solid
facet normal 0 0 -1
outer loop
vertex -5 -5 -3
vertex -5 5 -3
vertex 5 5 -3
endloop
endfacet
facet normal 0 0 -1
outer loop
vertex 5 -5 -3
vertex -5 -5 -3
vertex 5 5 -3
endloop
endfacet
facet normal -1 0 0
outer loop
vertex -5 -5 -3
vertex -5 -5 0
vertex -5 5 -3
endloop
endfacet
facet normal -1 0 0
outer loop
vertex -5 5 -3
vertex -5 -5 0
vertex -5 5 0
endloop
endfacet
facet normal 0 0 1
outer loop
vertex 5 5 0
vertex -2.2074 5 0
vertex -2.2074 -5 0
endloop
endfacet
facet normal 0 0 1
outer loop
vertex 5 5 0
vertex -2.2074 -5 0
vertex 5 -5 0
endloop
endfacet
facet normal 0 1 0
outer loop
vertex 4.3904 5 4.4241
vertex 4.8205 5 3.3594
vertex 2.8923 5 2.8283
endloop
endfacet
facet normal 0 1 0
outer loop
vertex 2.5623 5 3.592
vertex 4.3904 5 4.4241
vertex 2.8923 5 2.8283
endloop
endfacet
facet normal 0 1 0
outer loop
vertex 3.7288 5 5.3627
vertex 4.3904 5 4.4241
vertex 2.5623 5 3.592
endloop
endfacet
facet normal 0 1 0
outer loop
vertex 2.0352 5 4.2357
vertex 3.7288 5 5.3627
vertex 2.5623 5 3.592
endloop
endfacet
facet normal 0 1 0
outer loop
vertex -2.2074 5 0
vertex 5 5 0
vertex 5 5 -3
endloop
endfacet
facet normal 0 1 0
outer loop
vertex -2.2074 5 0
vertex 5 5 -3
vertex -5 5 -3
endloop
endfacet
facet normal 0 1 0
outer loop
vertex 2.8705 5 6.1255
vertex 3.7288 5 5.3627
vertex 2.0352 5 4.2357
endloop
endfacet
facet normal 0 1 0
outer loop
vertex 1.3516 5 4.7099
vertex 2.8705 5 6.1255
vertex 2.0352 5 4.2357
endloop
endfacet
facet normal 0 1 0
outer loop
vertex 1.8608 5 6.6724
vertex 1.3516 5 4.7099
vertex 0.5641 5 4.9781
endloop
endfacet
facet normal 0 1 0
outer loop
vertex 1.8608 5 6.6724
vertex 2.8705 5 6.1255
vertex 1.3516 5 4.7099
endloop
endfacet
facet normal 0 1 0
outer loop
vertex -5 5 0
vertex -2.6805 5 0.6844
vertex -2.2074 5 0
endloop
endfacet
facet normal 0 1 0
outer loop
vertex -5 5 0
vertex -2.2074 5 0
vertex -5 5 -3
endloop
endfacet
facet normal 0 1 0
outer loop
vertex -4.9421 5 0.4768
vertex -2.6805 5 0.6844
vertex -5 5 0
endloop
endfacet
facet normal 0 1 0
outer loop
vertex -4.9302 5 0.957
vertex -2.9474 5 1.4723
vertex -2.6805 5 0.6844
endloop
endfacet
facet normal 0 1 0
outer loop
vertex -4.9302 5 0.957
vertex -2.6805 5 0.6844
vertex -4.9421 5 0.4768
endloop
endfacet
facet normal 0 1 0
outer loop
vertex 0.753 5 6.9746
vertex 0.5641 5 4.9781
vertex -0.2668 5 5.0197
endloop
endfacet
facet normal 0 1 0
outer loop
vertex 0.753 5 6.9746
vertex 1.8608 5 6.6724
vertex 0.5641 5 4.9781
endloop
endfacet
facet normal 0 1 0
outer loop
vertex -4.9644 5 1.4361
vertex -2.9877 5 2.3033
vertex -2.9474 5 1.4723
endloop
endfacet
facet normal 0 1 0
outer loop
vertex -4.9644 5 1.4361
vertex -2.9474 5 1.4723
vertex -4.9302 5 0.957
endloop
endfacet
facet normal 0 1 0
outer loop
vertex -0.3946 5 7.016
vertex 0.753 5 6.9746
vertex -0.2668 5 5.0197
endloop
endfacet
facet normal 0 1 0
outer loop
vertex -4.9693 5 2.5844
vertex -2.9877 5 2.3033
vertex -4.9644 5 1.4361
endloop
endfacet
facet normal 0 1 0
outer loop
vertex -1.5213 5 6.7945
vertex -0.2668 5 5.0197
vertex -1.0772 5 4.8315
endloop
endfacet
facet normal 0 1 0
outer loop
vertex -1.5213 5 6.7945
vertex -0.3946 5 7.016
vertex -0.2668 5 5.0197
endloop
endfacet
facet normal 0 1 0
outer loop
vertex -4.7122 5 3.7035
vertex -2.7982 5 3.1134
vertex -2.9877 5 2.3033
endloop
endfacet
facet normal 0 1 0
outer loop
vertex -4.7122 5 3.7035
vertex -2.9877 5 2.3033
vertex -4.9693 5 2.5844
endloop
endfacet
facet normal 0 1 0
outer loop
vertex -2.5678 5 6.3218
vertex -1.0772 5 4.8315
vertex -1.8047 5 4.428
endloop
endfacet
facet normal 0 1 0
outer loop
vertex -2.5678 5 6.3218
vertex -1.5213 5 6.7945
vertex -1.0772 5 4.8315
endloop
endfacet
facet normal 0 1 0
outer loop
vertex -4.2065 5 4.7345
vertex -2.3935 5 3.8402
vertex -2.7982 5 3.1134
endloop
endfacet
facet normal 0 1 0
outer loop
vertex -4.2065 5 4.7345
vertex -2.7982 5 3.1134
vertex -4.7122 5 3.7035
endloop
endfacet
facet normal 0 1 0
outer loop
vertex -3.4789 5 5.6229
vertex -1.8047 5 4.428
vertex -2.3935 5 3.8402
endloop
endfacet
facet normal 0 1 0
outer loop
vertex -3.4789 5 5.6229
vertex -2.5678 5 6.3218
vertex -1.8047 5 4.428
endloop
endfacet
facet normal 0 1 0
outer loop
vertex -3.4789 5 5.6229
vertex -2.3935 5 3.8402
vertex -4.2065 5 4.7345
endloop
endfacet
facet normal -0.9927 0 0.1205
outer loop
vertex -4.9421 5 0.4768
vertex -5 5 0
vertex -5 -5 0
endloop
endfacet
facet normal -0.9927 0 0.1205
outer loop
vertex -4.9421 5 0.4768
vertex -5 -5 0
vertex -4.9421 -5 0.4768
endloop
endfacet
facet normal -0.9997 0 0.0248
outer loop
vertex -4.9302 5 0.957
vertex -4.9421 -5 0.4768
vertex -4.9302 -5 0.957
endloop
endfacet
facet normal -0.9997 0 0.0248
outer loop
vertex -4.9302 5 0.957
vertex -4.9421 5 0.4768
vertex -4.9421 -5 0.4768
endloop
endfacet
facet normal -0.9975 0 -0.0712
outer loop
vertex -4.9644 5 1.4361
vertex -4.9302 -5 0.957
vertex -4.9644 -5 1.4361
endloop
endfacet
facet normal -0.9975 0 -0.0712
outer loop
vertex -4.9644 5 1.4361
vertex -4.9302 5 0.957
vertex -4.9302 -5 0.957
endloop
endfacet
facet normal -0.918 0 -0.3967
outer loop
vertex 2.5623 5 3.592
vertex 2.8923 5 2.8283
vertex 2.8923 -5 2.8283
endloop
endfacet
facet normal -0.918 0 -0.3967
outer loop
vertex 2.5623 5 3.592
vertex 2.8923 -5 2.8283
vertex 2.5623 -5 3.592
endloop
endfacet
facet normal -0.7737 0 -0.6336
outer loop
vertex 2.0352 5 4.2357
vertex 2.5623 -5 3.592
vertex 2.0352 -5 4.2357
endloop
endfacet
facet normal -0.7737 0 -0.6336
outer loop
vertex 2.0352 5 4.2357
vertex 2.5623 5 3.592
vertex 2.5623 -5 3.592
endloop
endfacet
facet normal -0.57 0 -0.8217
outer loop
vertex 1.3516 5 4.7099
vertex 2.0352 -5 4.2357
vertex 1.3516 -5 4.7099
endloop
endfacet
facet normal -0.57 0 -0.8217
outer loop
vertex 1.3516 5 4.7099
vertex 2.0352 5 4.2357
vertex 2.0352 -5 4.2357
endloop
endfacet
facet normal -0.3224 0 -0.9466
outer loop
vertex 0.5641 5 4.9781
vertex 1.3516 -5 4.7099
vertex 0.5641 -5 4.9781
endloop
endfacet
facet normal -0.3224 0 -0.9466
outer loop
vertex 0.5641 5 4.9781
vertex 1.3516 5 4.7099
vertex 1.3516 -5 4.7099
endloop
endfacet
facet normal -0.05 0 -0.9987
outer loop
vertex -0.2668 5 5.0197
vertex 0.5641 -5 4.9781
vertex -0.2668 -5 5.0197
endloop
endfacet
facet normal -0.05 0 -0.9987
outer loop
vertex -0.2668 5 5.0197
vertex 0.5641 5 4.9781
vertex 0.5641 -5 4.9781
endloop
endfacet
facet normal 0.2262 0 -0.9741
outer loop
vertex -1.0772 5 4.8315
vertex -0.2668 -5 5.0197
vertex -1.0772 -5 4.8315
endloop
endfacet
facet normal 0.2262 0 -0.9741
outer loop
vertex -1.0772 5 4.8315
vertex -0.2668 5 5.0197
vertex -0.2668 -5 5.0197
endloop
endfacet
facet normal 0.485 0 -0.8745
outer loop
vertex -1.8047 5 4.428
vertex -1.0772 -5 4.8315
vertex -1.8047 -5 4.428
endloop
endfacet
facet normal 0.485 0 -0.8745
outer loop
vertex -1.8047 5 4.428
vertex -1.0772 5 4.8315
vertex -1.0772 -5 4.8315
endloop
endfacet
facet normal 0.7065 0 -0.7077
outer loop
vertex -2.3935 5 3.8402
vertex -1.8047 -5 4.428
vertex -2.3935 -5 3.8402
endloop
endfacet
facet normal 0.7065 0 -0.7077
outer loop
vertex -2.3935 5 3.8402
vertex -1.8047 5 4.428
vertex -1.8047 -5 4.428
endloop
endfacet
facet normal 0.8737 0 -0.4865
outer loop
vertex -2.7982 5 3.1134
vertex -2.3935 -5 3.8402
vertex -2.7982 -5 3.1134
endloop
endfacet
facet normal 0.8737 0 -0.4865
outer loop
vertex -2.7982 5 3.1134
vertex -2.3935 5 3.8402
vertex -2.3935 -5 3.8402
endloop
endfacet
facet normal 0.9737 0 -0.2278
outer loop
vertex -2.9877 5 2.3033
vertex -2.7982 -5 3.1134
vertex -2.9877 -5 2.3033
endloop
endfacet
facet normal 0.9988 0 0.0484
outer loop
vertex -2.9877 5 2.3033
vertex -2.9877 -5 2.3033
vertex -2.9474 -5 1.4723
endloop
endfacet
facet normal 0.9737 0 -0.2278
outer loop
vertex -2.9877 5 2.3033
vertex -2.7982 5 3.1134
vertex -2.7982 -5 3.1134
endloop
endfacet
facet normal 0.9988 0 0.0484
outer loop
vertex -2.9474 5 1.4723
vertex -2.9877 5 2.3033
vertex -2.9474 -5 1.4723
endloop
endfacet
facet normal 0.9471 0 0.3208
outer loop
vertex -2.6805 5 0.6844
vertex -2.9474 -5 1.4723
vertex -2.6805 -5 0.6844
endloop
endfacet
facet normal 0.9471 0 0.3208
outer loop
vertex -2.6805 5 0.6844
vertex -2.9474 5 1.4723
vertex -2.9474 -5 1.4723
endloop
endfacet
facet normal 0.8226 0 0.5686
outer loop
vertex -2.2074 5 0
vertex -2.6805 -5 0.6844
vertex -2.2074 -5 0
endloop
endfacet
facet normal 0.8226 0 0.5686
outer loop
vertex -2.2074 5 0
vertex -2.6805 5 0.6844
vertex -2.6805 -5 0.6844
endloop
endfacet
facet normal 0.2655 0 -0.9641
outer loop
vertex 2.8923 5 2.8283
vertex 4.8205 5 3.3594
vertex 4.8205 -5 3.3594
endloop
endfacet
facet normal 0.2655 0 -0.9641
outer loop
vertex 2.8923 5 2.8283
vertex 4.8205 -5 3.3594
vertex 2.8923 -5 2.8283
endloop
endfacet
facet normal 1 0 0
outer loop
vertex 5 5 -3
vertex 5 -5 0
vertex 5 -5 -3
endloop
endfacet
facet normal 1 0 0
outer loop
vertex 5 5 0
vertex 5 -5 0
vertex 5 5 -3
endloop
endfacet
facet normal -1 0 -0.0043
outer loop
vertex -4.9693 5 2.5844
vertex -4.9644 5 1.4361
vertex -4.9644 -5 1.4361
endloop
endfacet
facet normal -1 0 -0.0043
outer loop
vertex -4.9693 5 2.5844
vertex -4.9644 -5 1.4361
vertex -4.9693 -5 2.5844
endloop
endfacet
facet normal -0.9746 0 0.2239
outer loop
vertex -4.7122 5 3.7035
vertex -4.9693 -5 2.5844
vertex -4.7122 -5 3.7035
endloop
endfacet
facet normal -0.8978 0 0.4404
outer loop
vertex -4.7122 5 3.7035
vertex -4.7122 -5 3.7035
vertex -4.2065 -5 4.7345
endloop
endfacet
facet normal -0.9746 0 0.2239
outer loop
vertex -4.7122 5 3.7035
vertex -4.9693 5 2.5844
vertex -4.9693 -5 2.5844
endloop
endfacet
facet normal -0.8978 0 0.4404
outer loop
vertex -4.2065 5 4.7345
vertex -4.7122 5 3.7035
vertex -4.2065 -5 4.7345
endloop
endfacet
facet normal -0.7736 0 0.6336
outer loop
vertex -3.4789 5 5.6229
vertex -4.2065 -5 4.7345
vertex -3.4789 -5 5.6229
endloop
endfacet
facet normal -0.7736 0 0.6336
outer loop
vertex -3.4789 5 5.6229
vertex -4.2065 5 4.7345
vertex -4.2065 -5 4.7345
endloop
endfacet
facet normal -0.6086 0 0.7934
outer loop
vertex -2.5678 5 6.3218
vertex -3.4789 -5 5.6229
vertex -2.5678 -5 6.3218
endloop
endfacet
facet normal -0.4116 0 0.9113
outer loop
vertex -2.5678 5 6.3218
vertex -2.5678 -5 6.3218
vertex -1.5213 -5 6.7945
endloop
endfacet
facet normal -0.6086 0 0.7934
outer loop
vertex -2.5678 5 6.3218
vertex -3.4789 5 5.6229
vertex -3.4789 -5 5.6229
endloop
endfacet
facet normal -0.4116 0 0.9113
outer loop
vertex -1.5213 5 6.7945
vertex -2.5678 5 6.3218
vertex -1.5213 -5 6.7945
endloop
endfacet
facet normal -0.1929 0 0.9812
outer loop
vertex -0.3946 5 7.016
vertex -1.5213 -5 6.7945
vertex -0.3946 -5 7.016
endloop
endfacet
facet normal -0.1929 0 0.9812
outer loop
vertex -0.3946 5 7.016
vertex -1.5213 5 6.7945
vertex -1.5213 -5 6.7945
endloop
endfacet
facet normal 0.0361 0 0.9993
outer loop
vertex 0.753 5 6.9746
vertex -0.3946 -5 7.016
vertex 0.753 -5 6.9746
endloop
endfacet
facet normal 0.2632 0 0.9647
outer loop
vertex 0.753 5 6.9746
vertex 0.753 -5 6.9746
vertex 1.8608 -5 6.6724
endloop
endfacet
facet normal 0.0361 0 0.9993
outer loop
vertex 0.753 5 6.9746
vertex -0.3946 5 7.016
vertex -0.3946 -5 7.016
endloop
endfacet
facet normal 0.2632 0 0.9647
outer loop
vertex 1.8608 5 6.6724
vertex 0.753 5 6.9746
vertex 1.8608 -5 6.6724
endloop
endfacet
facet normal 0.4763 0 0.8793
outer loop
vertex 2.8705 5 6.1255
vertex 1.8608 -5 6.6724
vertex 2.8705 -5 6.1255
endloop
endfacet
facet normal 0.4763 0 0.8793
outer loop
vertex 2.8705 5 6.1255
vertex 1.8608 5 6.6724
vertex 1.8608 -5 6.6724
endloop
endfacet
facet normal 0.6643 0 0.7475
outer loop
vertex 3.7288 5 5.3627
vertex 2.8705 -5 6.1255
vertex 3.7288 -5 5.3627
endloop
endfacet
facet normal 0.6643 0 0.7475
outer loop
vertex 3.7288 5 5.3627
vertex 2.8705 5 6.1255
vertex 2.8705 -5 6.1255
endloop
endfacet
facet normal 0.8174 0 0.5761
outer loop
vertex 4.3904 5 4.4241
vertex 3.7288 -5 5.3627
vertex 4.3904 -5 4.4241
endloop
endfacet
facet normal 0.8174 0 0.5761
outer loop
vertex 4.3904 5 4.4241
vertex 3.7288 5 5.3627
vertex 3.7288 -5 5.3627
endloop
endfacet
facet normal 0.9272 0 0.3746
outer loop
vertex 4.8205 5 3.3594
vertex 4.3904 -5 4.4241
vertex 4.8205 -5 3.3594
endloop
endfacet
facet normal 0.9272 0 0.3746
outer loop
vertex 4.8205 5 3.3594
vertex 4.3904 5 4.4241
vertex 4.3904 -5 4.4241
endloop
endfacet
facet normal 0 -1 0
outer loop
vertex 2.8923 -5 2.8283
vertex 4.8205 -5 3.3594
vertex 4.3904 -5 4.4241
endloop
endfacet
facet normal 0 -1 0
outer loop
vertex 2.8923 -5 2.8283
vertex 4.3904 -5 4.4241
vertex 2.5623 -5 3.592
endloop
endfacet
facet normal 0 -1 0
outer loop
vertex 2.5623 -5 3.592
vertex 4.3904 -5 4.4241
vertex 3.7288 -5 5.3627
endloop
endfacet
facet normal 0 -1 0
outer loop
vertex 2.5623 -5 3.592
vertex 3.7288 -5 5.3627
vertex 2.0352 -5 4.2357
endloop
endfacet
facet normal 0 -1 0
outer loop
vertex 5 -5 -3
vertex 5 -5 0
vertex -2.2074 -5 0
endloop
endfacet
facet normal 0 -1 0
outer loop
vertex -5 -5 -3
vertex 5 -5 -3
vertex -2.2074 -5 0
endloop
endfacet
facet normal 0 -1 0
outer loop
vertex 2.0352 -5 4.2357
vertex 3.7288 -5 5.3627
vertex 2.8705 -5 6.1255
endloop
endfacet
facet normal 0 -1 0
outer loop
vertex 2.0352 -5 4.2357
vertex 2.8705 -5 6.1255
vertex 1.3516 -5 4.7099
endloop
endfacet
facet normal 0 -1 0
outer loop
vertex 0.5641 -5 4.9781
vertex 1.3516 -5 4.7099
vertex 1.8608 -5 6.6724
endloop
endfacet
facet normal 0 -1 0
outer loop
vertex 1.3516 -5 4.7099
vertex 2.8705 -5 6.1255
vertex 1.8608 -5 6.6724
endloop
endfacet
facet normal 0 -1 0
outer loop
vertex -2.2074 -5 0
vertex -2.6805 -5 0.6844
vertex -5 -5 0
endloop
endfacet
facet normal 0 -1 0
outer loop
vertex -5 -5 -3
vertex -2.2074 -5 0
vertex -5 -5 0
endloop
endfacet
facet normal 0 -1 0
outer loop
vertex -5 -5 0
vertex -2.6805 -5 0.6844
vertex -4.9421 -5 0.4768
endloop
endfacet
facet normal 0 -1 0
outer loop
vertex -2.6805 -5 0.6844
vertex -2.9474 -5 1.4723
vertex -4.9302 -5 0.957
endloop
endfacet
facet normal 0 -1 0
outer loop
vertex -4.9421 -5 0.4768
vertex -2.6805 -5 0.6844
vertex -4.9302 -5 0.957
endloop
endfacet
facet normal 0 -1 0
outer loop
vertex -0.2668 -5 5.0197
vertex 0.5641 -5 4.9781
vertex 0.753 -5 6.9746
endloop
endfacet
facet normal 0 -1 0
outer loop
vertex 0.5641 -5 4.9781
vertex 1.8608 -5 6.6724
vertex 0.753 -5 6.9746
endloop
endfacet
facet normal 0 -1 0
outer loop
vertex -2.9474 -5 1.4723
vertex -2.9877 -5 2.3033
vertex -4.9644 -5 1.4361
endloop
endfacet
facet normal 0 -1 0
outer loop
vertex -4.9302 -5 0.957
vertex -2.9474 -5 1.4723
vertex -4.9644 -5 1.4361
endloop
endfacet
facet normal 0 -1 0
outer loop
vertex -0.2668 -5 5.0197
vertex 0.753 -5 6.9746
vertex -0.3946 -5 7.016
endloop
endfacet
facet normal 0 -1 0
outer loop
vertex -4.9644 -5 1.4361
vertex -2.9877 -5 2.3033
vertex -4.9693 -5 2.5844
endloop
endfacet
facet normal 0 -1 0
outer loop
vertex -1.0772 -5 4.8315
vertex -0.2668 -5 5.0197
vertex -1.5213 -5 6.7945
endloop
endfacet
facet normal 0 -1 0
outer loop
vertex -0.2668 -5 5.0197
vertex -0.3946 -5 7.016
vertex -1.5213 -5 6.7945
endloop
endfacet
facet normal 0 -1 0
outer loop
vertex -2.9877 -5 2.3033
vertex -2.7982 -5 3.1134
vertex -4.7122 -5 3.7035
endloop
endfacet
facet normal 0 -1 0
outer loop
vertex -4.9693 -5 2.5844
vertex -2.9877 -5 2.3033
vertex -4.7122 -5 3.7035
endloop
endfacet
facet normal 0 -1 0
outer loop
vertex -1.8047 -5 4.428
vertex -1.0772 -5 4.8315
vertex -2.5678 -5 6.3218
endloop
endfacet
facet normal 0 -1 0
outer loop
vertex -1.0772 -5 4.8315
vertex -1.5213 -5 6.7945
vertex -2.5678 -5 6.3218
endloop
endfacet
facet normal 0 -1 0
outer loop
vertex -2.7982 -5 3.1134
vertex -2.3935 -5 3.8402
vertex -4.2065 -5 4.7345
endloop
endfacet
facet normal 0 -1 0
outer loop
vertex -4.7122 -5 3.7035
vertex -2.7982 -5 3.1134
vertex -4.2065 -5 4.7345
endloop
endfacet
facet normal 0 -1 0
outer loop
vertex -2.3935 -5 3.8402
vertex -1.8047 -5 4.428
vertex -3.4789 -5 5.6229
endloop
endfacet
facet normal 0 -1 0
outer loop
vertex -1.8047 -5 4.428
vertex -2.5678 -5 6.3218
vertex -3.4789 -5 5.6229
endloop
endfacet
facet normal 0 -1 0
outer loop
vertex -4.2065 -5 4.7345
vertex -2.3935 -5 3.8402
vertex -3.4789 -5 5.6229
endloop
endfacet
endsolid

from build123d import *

# Parameters (mm, degrees)
F0_W        = 10
F0_H        = 10
F1_DEPTH    = 3
F3_DEPTH    = 10
F4_T1_DEPTH = 10


# Not quite as in the source:
# - a fillet or chamfer that OpenCascade refuses, or shapes differently, is made with other operations: its cross-section is extruded or revolved along the edge and cut away or added


with BuildPart() as f1:
    # F0 (on Top) → F1 (new body)
    with BuildSketch(Plane.XY):
        Rectangle(F0_W, F0_H)
    extrude(amount=-F1_DEPTH)

    # F2 (on face) → F3 (join)
    with BuildSketch(Plane(origin=(0, 5, 0), x_dir=(-1, 0, 0), z_dir=(0, 1, 0))):
        with BuildLine():
            Line((0, -0.9684120044), (0, -2.9684120044))
            ThreePointArc((0, -2.9684120044), (3.9773759731, 5.0615187488), (-4.8204695111, 3.359395848))
            Line((-4.8204695111, 3.359395848), (-2.8922817066, 2.828272707))
            ThreePointArc((-2.8922817066, 2.828272707), (2.3864255838, 3.8495464475), (0, -0.9684120044))
        make_face()
    extrude(amount=-F3_DEPTH)

    # F4: fillet of radius 5 on 1 edges, made by hand

    # F4_s2 → F4_t1 (join)
    with BuildSketch(Plane.XZ.offset(-5)):
        with BuildLine():
            ThreePointArc((-5, 0), (-4.930361996, 0.7167697097), (-4.9644138164, 1.4361088104))
            ThreePointArc((-4.9644138164, 1.4361088104), (-4.8203188847, 0.7032334307), (-4.5686595645, 0))
            Line((-4.5686595645, 0), (-5, 0))
        make_face()
    extrude(amount=F4_T1_DEPTH)


solid = f1.part
